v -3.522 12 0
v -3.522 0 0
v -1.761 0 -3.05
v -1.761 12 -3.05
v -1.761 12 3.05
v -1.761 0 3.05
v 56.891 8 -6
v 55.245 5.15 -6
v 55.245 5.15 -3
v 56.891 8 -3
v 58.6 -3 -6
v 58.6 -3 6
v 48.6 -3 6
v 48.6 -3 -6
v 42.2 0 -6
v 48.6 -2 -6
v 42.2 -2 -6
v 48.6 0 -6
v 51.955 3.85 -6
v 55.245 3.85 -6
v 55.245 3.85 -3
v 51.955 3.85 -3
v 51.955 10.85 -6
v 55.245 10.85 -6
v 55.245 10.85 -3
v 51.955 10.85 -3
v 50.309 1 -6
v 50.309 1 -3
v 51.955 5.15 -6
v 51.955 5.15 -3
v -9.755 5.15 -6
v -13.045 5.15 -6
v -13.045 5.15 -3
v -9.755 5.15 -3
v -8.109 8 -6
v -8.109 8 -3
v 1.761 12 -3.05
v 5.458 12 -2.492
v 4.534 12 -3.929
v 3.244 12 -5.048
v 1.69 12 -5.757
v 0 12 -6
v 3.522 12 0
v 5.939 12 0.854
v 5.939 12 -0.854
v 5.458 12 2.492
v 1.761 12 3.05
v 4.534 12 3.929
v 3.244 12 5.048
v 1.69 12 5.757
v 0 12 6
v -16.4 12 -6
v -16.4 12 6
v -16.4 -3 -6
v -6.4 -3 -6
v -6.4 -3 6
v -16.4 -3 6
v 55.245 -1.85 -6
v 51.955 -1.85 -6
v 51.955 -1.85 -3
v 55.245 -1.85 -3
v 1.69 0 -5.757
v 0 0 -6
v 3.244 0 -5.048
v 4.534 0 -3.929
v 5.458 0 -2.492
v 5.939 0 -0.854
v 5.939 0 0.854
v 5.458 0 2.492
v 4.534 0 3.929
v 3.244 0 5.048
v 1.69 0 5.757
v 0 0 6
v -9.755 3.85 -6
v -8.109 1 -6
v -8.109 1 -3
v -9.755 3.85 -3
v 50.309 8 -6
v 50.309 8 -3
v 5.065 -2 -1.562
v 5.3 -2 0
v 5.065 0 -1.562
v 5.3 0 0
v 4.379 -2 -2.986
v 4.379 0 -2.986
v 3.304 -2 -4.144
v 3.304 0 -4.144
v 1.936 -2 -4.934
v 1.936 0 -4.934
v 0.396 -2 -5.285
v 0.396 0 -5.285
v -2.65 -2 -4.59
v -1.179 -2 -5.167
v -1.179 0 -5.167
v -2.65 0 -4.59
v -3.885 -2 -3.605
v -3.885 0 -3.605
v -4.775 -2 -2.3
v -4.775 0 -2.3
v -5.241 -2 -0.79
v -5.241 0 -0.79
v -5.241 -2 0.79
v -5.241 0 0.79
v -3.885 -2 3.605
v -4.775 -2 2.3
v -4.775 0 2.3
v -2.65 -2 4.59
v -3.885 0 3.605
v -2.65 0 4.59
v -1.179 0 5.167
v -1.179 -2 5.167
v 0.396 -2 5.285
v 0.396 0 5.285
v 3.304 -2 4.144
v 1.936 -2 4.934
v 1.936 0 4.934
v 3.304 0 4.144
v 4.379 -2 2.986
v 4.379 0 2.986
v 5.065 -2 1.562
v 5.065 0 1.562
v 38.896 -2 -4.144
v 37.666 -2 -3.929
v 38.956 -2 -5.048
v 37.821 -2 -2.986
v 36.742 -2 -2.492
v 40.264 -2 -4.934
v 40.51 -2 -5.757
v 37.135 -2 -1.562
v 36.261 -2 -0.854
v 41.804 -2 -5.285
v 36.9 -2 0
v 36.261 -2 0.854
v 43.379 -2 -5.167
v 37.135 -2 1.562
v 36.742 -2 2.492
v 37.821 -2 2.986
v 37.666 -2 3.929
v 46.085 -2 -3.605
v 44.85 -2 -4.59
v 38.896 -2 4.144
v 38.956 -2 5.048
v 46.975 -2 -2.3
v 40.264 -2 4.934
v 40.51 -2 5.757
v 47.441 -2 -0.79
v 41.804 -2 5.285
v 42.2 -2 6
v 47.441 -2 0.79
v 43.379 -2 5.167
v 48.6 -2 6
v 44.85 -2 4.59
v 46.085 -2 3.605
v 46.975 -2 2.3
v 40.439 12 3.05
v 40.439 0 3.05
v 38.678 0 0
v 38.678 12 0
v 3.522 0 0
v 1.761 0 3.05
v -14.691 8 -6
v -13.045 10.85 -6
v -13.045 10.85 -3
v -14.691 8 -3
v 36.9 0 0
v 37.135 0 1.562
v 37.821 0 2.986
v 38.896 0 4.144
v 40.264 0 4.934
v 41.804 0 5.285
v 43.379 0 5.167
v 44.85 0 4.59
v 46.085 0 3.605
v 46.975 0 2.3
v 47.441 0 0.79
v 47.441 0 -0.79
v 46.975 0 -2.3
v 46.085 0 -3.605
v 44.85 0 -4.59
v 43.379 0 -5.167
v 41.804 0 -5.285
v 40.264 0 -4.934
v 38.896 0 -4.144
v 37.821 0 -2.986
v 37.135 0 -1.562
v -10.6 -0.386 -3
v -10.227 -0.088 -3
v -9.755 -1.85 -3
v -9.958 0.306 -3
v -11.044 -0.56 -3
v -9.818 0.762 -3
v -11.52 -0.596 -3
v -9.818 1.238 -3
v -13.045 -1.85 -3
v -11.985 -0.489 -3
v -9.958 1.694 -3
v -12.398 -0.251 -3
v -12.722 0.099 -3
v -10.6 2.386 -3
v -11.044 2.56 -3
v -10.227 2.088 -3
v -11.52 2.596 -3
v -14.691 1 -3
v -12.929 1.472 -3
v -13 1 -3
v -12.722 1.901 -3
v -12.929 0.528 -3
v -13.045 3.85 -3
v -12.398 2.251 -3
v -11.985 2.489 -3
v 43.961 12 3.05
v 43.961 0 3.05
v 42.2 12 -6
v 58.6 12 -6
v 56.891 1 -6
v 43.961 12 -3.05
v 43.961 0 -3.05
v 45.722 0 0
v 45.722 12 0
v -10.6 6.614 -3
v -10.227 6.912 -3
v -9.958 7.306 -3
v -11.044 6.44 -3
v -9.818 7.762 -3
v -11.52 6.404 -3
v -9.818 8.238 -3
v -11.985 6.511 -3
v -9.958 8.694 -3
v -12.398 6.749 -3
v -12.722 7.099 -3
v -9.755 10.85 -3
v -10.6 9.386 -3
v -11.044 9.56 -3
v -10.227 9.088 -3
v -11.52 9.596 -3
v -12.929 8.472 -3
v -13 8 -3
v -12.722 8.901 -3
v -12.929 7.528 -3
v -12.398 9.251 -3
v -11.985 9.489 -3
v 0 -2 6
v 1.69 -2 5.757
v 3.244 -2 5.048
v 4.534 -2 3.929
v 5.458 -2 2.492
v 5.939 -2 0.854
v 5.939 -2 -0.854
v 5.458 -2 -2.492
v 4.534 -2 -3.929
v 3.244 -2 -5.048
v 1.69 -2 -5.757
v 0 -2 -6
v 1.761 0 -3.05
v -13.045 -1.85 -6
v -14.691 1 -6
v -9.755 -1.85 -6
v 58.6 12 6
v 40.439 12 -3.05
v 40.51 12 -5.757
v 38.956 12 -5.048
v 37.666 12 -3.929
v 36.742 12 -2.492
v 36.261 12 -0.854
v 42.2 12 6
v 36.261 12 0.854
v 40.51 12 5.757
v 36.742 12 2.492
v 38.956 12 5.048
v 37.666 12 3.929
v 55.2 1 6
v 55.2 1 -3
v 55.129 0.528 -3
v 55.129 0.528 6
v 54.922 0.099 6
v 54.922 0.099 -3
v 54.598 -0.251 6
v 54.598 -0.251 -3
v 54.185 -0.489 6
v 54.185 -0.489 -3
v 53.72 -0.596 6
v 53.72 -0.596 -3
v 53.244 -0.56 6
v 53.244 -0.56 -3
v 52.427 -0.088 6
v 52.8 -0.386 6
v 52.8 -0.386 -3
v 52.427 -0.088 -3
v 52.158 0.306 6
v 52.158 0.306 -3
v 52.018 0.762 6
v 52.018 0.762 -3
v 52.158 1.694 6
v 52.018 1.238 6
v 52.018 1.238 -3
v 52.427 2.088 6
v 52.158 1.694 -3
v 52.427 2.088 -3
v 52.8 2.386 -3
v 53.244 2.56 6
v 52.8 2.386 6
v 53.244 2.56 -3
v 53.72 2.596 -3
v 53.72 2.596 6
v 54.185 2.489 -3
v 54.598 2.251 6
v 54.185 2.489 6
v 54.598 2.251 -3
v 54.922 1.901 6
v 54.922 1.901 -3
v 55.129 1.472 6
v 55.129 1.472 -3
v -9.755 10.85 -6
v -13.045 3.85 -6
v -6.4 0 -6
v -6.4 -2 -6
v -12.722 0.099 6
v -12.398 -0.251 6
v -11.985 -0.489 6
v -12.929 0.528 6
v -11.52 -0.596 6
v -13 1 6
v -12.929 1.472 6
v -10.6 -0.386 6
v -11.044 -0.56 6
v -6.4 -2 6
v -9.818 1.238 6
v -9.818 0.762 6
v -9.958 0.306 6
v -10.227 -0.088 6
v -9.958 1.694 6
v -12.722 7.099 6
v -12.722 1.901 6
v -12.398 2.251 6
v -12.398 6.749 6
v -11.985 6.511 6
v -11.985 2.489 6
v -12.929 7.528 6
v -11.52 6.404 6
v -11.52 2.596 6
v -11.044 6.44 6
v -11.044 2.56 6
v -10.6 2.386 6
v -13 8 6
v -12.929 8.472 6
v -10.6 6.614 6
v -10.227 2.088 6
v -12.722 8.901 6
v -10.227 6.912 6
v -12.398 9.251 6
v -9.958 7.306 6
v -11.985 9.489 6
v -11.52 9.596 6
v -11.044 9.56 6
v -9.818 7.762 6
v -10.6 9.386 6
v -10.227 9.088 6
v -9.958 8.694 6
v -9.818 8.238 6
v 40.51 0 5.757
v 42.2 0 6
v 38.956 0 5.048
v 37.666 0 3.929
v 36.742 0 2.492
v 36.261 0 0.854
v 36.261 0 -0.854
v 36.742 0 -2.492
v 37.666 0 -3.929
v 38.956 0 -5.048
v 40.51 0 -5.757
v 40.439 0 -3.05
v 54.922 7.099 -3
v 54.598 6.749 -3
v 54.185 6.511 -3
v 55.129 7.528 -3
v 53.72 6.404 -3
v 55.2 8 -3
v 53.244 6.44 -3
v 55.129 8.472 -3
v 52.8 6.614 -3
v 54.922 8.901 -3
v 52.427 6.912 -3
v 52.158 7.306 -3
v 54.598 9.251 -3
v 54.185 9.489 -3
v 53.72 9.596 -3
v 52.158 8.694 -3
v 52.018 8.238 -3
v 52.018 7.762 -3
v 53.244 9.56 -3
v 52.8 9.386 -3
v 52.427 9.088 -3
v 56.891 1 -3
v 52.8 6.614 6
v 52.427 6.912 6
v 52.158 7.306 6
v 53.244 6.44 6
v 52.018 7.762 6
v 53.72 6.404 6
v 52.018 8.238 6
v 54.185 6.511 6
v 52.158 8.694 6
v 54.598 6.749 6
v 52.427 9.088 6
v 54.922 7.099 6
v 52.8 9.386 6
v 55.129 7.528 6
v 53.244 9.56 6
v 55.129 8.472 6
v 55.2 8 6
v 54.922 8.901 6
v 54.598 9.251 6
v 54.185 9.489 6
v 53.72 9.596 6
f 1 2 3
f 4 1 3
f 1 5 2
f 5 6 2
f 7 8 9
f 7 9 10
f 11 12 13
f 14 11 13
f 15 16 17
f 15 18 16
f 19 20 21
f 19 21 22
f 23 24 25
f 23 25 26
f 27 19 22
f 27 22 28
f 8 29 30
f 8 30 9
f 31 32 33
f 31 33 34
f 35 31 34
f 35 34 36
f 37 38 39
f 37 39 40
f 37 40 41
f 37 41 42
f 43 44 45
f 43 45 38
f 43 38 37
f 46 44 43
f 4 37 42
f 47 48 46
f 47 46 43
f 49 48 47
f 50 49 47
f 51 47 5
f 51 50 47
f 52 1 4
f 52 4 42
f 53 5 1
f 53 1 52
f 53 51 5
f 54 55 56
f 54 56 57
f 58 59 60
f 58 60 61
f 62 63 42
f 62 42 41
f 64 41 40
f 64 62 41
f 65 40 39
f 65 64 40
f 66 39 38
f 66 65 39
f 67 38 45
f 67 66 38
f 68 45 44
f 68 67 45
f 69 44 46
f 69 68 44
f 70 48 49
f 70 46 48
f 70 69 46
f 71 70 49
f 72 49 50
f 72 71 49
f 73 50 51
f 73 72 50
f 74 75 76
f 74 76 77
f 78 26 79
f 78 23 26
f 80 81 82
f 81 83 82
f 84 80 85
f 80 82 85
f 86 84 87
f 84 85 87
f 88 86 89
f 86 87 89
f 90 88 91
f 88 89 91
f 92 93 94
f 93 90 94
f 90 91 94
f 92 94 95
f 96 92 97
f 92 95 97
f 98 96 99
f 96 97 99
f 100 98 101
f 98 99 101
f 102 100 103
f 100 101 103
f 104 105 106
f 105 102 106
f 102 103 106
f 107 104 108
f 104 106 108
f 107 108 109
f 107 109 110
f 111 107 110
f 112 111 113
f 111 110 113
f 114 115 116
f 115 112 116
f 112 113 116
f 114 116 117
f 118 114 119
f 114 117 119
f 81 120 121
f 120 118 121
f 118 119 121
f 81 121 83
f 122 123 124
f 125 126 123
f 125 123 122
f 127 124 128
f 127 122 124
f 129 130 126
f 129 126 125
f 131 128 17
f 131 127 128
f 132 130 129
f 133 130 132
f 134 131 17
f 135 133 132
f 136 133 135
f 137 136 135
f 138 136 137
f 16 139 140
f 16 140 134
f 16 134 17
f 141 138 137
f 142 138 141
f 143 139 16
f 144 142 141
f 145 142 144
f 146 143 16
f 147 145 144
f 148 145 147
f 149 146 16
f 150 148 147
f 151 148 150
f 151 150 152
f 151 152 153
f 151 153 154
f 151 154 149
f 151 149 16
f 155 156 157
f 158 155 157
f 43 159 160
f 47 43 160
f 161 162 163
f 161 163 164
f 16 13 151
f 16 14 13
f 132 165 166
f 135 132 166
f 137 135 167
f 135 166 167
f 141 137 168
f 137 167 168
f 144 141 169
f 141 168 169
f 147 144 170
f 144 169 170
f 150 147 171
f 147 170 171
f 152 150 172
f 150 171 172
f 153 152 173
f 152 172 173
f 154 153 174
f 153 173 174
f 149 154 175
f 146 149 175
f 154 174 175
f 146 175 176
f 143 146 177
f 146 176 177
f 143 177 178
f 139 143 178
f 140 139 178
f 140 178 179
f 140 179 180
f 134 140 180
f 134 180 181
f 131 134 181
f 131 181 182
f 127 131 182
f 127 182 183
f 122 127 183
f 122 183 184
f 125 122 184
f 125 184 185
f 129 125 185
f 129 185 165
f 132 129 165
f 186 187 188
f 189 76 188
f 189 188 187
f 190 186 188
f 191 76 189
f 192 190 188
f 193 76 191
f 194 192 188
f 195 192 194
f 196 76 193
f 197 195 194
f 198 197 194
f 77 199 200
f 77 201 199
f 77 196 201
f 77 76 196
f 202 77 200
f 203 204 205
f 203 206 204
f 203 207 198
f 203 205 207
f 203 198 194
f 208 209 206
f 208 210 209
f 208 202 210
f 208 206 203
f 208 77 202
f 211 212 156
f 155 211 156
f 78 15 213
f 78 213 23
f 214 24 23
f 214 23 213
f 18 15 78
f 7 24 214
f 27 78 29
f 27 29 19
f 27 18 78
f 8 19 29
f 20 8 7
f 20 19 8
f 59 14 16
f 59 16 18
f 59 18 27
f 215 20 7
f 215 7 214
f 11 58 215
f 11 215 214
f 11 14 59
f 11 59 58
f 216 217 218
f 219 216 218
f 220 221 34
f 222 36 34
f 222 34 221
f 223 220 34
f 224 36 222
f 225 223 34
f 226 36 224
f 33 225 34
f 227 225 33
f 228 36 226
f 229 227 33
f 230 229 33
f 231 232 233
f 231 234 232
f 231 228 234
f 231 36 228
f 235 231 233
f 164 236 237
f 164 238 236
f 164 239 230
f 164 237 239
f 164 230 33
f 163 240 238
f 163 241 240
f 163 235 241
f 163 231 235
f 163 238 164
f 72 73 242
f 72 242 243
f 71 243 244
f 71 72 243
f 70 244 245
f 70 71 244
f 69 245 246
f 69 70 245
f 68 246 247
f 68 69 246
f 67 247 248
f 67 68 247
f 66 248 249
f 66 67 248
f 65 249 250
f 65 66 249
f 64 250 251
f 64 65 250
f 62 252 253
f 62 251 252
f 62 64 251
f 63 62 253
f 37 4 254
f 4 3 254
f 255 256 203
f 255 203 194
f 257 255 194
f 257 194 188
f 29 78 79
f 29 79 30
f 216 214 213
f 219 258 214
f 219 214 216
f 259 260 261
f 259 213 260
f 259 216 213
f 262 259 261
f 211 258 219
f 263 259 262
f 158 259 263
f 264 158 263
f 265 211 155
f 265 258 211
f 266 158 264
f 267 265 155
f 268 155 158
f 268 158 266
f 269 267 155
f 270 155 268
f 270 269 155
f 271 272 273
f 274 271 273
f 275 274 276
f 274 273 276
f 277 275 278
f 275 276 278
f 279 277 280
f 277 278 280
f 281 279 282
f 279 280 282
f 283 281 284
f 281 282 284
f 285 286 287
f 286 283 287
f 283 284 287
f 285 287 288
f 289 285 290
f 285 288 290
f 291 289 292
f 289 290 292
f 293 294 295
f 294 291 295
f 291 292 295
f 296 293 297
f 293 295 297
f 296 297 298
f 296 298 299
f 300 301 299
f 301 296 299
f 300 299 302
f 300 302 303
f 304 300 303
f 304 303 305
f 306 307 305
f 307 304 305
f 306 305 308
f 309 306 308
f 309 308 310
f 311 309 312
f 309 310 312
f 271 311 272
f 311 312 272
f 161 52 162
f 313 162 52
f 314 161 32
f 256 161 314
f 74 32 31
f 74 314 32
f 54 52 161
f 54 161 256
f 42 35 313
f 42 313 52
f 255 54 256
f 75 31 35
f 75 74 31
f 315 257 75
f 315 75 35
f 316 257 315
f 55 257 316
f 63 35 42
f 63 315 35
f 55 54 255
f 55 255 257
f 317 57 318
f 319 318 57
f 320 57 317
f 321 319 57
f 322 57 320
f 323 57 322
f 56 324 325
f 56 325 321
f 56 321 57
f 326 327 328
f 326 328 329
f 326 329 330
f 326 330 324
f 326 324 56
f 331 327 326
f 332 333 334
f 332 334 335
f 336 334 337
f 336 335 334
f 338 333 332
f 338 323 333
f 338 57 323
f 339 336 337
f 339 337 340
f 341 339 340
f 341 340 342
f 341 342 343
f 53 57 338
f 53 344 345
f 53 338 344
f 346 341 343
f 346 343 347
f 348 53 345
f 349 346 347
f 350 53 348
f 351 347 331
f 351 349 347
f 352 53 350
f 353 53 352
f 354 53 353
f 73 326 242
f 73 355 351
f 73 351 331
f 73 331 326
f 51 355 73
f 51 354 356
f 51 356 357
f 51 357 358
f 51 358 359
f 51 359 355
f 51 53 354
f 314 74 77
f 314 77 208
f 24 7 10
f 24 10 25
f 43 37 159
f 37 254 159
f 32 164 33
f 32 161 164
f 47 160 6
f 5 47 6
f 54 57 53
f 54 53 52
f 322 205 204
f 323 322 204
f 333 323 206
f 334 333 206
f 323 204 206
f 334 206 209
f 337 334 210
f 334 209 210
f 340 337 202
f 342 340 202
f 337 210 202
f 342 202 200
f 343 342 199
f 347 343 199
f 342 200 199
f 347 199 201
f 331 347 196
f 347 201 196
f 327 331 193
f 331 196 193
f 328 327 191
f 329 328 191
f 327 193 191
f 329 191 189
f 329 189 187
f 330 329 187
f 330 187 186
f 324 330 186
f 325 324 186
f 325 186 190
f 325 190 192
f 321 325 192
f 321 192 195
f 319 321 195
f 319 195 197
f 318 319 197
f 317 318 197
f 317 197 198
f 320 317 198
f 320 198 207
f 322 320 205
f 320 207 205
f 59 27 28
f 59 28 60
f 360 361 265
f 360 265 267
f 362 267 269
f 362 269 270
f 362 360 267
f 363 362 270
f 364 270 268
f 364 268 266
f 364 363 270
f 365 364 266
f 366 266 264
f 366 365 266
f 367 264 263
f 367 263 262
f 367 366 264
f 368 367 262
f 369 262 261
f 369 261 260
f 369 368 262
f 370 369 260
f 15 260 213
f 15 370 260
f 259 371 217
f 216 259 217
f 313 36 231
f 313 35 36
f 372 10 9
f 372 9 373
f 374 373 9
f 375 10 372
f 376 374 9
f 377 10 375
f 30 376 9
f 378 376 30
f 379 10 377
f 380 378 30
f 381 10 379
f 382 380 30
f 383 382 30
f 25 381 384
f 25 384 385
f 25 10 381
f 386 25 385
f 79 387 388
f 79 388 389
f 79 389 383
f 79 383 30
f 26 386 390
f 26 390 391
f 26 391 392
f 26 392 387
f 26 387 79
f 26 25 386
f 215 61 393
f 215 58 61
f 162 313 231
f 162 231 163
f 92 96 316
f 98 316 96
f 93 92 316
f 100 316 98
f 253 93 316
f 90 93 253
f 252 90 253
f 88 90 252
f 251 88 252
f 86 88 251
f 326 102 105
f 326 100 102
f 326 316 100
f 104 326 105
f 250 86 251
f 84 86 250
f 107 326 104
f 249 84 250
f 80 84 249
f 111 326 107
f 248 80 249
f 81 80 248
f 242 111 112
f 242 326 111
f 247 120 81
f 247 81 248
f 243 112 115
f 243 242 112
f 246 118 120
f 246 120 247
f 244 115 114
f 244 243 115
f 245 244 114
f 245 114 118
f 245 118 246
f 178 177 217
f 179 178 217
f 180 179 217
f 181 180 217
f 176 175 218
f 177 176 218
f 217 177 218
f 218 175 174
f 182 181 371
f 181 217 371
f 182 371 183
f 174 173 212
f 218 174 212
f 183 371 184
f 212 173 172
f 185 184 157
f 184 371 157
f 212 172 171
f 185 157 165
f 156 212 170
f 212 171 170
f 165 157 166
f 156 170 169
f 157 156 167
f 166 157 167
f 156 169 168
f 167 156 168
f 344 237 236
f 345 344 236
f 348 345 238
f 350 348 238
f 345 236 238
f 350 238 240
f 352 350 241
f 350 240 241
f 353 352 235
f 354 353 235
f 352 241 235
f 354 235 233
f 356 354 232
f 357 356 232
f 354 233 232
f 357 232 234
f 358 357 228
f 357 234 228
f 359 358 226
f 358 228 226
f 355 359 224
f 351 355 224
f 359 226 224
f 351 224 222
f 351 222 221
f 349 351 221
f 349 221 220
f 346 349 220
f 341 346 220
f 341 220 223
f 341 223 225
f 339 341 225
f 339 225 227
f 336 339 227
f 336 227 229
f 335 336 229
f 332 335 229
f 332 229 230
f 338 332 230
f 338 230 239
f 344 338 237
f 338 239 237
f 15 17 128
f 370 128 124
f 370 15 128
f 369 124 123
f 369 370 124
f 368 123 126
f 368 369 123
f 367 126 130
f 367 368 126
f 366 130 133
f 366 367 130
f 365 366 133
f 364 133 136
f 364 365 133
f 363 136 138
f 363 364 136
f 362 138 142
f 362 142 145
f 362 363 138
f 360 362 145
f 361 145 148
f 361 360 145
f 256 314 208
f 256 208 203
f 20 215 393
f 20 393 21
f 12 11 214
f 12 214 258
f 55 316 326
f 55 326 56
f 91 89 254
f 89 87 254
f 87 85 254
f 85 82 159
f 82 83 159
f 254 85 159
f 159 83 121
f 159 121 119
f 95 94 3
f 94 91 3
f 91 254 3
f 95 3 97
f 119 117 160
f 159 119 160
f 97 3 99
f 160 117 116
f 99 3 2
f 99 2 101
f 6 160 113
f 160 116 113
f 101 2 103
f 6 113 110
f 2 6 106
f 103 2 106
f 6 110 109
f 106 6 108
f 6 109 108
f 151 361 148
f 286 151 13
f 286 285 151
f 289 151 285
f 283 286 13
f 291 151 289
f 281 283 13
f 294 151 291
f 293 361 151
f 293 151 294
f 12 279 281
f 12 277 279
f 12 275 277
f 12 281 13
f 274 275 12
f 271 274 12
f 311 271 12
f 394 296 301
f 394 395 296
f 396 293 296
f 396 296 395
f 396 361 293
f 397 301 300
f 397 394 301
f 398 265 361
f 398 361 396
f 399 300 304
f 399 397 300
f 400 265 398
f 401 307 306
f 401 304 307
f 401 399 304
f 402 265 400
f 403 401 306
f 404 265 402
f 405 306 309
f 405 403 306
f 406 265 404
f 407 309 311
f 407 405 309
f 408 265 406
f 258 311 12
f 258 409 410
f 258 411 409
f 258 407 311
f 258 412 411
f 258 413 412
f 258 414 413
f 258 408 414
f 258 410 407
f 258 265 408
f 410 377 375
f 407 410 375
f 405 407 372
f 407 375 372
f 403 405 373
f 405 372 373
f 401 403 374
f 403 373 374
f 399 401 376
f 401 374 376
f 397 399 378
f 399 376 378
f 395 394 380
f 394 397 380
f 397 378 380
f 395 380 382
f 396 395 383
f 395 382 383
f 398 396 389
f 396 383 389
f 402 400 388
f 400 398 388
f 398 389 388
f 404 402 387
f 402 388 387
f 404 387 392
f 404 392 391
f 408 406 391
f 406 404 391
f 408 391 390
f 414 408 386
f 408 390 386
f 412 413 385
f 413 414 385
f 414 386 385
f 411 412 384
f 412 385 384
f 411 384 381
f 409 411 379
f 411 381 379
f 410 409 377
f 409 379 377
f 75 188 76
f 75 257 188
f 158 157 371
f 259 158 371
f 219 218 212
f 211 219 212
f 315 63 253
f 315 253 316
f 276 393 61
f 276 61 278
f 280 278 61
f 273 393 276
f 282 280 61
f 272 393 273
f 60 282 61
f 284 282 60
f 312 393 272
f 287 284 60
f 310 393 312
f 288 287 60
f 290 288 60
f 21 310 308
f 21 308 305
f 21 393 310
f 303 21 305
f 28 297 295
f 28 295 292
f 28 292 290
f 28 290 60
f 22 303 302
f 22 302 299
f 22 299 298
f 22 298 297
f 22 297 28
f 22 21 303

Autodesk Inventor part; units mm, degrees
ref_plane "YZ Plane" through (0, 0, 0) normal (1, 0, 0) x (0, 1, 0)
ref_plane "XZ Plane" through (0, 0, 0) normal (0, 1, 0) x (-1, 0, 0)
sketch "スケッチ1" plane through (0, 0, 0) normal (0, 1, 0) x (-1, 0, 0)
  line L0 (-3.5218, 0) -> (-1.7609, 3.05)
  line L1 (-1.7609, 3.05) -> (1.7609, 3.05)
  line L2 (1.7609, 3.05) -> (3.5218, 0)
  line L3 (3.5218, 0) -> (1.7609, -3.05)
  line L4 (1.7609, -3.05) -> (-1.7609, -3.05)
  line L5 (-1.7609, -3.05) -> (-3.5218, 0)
  circle A0 centre (0, 0) radius 6
  line L6 (0, 6) -> (16.4, 6)
  line L7 (16.4, 6) -> (16.4, -6)
  line L8 (16.4, -6) -> (0, -6)
  line L9 (0, -6) -> (0, 6)
  point P0 (0, -6)
  dimension "d1" = 12
  dimension "d0" = 6.1
  dimension "d2" = 16.4
extrude "押し出し1" add sketch "スケッチ1" along normal blind 12 contours L5 L4 L9 A0 L1 L0 | L9 A0 L4 L3 L2 L1 | L6 L7 L8 A0
sketch "スケッチ2" plane through (0, 0, -6) normal (0, 0, -1) x (-1, 0, 0)
  line L0 (0, 12) -> (16.4, 12) projected
  line L1 (16.4, 12) -> (6.4, 12)
  line L2 (6.4, 12) -> (6.4, -3)
  line L3 (6.4, -3) -> (16.4, -3)
  line L4 (16.4, -3) -> (16.4, 12)
  point P0 (0, 0)
  dimension "d5" = 10
  dimension "d6" = 15
extrude "押し出し2" add sketch "スケッチ2" against normal up to surface (12 mm away)
sketch "スケッチ3" plane through (0, 12, -6) normal (0, 0, -1) x (-1, 0, 0)
  line L0 (14.6909, -4) -> (13.0454, -6.85)
  line L1 (13.0454, -6.85) -> (9.7546, -6.85)
  line L2 (9.7546, -6.85) -> (8.1091, -4)
  line L3 (8.1091, -4) -> (9.7546, -1.15)
  line L4 (9.7546, -1.15) -> (13.0454, -1.15)
  line L5 (13.0454, -1.15) -> (14.6909, -4)
  line L6 (9.7546, -13.85) -> (8.1091, -11)
  line L7 (8.1091, -11) -> (9.7546, -8.15)
  line L8 (9.7546, -8.15) -> (13.0454, -8.15)
  line L9 (13.0454, -8.15) -> (14.6909, -11)
  line L10 (14.6909, -11) -> (13.0454, -13.85)
  line L11 (13.0454, -13.85) -> (9.7546, -13.85)
  line L12 (16.4, -15) -> (16.4, 0) projected
  line L13 (16.4, -7.5) -> (20.3002, -7.5)
  circle A0 centre (11.4, -4) radius 1.6
  circle A1 centre (11.4, -11) radius 1.6
  point P0 (0, -12)
  dimension "d9" = 5.7
  dimension "d10" = 3.5
  dimension "d11" = 5
  dimension "d14" = 3.2
  dimension "d15" = 3.2
extrude "押し出し3" cut sketch "スケッチ3" against normal blind 3 contours L0 L1 L2 L3 L4 L5 | L6 L7 L8 L9 L10 L11 | A0 | A1
extrude "押し出し4" cut sketch "スケッチ3" against normal through all contours A0 | A1
ref_plane "作業平面1" through (21.1, 12, -6) normal (-1, 0, 0) x (0, 0, 1)
sketch "スケッチ4" plane through (0, 0, 0) normal (0, -1, 0) x (1, 0, 0)
  circle A0 centre (0, 0) radius 5.3
  line L0 (1.7609, 3.05) -> (-1.7609, 3.05) projected
  line L1 (3.5218, 0) -> (1.7609, 3.05) projected
  line L2 (1.7609, -3.05) -> (3.5218, 0) projected
  line L3 (-1.7609, -3.05) -> (1.7609, -3.05) projected
  line L4 (-3.5218, 0) -> (-1.7609, -3.05) projected
  line L5 (-1.7609, 3.05) -> (-3.5218, 0) projected
  line L6 (-6.4, 6) -> (-6.4, -6) projected
  line L7 (0, -6) -> (-6.4, -6) projected
  arc A1 (0, -6) -> (0, 6) centre (0, 0) ccw projected
  line L8 (-6.4, 6) -> (0, 6) projected
  dimension "d19" = 10.6
extrude "押し出し5" add sketch "スケッチ4" along normal blind 2 contours L8 A1 L7 L6
mirror "ミラー2" about plane through (21.1, 12, -6) normal (-1, 0, 0)
properties part number "wheel_setter"
